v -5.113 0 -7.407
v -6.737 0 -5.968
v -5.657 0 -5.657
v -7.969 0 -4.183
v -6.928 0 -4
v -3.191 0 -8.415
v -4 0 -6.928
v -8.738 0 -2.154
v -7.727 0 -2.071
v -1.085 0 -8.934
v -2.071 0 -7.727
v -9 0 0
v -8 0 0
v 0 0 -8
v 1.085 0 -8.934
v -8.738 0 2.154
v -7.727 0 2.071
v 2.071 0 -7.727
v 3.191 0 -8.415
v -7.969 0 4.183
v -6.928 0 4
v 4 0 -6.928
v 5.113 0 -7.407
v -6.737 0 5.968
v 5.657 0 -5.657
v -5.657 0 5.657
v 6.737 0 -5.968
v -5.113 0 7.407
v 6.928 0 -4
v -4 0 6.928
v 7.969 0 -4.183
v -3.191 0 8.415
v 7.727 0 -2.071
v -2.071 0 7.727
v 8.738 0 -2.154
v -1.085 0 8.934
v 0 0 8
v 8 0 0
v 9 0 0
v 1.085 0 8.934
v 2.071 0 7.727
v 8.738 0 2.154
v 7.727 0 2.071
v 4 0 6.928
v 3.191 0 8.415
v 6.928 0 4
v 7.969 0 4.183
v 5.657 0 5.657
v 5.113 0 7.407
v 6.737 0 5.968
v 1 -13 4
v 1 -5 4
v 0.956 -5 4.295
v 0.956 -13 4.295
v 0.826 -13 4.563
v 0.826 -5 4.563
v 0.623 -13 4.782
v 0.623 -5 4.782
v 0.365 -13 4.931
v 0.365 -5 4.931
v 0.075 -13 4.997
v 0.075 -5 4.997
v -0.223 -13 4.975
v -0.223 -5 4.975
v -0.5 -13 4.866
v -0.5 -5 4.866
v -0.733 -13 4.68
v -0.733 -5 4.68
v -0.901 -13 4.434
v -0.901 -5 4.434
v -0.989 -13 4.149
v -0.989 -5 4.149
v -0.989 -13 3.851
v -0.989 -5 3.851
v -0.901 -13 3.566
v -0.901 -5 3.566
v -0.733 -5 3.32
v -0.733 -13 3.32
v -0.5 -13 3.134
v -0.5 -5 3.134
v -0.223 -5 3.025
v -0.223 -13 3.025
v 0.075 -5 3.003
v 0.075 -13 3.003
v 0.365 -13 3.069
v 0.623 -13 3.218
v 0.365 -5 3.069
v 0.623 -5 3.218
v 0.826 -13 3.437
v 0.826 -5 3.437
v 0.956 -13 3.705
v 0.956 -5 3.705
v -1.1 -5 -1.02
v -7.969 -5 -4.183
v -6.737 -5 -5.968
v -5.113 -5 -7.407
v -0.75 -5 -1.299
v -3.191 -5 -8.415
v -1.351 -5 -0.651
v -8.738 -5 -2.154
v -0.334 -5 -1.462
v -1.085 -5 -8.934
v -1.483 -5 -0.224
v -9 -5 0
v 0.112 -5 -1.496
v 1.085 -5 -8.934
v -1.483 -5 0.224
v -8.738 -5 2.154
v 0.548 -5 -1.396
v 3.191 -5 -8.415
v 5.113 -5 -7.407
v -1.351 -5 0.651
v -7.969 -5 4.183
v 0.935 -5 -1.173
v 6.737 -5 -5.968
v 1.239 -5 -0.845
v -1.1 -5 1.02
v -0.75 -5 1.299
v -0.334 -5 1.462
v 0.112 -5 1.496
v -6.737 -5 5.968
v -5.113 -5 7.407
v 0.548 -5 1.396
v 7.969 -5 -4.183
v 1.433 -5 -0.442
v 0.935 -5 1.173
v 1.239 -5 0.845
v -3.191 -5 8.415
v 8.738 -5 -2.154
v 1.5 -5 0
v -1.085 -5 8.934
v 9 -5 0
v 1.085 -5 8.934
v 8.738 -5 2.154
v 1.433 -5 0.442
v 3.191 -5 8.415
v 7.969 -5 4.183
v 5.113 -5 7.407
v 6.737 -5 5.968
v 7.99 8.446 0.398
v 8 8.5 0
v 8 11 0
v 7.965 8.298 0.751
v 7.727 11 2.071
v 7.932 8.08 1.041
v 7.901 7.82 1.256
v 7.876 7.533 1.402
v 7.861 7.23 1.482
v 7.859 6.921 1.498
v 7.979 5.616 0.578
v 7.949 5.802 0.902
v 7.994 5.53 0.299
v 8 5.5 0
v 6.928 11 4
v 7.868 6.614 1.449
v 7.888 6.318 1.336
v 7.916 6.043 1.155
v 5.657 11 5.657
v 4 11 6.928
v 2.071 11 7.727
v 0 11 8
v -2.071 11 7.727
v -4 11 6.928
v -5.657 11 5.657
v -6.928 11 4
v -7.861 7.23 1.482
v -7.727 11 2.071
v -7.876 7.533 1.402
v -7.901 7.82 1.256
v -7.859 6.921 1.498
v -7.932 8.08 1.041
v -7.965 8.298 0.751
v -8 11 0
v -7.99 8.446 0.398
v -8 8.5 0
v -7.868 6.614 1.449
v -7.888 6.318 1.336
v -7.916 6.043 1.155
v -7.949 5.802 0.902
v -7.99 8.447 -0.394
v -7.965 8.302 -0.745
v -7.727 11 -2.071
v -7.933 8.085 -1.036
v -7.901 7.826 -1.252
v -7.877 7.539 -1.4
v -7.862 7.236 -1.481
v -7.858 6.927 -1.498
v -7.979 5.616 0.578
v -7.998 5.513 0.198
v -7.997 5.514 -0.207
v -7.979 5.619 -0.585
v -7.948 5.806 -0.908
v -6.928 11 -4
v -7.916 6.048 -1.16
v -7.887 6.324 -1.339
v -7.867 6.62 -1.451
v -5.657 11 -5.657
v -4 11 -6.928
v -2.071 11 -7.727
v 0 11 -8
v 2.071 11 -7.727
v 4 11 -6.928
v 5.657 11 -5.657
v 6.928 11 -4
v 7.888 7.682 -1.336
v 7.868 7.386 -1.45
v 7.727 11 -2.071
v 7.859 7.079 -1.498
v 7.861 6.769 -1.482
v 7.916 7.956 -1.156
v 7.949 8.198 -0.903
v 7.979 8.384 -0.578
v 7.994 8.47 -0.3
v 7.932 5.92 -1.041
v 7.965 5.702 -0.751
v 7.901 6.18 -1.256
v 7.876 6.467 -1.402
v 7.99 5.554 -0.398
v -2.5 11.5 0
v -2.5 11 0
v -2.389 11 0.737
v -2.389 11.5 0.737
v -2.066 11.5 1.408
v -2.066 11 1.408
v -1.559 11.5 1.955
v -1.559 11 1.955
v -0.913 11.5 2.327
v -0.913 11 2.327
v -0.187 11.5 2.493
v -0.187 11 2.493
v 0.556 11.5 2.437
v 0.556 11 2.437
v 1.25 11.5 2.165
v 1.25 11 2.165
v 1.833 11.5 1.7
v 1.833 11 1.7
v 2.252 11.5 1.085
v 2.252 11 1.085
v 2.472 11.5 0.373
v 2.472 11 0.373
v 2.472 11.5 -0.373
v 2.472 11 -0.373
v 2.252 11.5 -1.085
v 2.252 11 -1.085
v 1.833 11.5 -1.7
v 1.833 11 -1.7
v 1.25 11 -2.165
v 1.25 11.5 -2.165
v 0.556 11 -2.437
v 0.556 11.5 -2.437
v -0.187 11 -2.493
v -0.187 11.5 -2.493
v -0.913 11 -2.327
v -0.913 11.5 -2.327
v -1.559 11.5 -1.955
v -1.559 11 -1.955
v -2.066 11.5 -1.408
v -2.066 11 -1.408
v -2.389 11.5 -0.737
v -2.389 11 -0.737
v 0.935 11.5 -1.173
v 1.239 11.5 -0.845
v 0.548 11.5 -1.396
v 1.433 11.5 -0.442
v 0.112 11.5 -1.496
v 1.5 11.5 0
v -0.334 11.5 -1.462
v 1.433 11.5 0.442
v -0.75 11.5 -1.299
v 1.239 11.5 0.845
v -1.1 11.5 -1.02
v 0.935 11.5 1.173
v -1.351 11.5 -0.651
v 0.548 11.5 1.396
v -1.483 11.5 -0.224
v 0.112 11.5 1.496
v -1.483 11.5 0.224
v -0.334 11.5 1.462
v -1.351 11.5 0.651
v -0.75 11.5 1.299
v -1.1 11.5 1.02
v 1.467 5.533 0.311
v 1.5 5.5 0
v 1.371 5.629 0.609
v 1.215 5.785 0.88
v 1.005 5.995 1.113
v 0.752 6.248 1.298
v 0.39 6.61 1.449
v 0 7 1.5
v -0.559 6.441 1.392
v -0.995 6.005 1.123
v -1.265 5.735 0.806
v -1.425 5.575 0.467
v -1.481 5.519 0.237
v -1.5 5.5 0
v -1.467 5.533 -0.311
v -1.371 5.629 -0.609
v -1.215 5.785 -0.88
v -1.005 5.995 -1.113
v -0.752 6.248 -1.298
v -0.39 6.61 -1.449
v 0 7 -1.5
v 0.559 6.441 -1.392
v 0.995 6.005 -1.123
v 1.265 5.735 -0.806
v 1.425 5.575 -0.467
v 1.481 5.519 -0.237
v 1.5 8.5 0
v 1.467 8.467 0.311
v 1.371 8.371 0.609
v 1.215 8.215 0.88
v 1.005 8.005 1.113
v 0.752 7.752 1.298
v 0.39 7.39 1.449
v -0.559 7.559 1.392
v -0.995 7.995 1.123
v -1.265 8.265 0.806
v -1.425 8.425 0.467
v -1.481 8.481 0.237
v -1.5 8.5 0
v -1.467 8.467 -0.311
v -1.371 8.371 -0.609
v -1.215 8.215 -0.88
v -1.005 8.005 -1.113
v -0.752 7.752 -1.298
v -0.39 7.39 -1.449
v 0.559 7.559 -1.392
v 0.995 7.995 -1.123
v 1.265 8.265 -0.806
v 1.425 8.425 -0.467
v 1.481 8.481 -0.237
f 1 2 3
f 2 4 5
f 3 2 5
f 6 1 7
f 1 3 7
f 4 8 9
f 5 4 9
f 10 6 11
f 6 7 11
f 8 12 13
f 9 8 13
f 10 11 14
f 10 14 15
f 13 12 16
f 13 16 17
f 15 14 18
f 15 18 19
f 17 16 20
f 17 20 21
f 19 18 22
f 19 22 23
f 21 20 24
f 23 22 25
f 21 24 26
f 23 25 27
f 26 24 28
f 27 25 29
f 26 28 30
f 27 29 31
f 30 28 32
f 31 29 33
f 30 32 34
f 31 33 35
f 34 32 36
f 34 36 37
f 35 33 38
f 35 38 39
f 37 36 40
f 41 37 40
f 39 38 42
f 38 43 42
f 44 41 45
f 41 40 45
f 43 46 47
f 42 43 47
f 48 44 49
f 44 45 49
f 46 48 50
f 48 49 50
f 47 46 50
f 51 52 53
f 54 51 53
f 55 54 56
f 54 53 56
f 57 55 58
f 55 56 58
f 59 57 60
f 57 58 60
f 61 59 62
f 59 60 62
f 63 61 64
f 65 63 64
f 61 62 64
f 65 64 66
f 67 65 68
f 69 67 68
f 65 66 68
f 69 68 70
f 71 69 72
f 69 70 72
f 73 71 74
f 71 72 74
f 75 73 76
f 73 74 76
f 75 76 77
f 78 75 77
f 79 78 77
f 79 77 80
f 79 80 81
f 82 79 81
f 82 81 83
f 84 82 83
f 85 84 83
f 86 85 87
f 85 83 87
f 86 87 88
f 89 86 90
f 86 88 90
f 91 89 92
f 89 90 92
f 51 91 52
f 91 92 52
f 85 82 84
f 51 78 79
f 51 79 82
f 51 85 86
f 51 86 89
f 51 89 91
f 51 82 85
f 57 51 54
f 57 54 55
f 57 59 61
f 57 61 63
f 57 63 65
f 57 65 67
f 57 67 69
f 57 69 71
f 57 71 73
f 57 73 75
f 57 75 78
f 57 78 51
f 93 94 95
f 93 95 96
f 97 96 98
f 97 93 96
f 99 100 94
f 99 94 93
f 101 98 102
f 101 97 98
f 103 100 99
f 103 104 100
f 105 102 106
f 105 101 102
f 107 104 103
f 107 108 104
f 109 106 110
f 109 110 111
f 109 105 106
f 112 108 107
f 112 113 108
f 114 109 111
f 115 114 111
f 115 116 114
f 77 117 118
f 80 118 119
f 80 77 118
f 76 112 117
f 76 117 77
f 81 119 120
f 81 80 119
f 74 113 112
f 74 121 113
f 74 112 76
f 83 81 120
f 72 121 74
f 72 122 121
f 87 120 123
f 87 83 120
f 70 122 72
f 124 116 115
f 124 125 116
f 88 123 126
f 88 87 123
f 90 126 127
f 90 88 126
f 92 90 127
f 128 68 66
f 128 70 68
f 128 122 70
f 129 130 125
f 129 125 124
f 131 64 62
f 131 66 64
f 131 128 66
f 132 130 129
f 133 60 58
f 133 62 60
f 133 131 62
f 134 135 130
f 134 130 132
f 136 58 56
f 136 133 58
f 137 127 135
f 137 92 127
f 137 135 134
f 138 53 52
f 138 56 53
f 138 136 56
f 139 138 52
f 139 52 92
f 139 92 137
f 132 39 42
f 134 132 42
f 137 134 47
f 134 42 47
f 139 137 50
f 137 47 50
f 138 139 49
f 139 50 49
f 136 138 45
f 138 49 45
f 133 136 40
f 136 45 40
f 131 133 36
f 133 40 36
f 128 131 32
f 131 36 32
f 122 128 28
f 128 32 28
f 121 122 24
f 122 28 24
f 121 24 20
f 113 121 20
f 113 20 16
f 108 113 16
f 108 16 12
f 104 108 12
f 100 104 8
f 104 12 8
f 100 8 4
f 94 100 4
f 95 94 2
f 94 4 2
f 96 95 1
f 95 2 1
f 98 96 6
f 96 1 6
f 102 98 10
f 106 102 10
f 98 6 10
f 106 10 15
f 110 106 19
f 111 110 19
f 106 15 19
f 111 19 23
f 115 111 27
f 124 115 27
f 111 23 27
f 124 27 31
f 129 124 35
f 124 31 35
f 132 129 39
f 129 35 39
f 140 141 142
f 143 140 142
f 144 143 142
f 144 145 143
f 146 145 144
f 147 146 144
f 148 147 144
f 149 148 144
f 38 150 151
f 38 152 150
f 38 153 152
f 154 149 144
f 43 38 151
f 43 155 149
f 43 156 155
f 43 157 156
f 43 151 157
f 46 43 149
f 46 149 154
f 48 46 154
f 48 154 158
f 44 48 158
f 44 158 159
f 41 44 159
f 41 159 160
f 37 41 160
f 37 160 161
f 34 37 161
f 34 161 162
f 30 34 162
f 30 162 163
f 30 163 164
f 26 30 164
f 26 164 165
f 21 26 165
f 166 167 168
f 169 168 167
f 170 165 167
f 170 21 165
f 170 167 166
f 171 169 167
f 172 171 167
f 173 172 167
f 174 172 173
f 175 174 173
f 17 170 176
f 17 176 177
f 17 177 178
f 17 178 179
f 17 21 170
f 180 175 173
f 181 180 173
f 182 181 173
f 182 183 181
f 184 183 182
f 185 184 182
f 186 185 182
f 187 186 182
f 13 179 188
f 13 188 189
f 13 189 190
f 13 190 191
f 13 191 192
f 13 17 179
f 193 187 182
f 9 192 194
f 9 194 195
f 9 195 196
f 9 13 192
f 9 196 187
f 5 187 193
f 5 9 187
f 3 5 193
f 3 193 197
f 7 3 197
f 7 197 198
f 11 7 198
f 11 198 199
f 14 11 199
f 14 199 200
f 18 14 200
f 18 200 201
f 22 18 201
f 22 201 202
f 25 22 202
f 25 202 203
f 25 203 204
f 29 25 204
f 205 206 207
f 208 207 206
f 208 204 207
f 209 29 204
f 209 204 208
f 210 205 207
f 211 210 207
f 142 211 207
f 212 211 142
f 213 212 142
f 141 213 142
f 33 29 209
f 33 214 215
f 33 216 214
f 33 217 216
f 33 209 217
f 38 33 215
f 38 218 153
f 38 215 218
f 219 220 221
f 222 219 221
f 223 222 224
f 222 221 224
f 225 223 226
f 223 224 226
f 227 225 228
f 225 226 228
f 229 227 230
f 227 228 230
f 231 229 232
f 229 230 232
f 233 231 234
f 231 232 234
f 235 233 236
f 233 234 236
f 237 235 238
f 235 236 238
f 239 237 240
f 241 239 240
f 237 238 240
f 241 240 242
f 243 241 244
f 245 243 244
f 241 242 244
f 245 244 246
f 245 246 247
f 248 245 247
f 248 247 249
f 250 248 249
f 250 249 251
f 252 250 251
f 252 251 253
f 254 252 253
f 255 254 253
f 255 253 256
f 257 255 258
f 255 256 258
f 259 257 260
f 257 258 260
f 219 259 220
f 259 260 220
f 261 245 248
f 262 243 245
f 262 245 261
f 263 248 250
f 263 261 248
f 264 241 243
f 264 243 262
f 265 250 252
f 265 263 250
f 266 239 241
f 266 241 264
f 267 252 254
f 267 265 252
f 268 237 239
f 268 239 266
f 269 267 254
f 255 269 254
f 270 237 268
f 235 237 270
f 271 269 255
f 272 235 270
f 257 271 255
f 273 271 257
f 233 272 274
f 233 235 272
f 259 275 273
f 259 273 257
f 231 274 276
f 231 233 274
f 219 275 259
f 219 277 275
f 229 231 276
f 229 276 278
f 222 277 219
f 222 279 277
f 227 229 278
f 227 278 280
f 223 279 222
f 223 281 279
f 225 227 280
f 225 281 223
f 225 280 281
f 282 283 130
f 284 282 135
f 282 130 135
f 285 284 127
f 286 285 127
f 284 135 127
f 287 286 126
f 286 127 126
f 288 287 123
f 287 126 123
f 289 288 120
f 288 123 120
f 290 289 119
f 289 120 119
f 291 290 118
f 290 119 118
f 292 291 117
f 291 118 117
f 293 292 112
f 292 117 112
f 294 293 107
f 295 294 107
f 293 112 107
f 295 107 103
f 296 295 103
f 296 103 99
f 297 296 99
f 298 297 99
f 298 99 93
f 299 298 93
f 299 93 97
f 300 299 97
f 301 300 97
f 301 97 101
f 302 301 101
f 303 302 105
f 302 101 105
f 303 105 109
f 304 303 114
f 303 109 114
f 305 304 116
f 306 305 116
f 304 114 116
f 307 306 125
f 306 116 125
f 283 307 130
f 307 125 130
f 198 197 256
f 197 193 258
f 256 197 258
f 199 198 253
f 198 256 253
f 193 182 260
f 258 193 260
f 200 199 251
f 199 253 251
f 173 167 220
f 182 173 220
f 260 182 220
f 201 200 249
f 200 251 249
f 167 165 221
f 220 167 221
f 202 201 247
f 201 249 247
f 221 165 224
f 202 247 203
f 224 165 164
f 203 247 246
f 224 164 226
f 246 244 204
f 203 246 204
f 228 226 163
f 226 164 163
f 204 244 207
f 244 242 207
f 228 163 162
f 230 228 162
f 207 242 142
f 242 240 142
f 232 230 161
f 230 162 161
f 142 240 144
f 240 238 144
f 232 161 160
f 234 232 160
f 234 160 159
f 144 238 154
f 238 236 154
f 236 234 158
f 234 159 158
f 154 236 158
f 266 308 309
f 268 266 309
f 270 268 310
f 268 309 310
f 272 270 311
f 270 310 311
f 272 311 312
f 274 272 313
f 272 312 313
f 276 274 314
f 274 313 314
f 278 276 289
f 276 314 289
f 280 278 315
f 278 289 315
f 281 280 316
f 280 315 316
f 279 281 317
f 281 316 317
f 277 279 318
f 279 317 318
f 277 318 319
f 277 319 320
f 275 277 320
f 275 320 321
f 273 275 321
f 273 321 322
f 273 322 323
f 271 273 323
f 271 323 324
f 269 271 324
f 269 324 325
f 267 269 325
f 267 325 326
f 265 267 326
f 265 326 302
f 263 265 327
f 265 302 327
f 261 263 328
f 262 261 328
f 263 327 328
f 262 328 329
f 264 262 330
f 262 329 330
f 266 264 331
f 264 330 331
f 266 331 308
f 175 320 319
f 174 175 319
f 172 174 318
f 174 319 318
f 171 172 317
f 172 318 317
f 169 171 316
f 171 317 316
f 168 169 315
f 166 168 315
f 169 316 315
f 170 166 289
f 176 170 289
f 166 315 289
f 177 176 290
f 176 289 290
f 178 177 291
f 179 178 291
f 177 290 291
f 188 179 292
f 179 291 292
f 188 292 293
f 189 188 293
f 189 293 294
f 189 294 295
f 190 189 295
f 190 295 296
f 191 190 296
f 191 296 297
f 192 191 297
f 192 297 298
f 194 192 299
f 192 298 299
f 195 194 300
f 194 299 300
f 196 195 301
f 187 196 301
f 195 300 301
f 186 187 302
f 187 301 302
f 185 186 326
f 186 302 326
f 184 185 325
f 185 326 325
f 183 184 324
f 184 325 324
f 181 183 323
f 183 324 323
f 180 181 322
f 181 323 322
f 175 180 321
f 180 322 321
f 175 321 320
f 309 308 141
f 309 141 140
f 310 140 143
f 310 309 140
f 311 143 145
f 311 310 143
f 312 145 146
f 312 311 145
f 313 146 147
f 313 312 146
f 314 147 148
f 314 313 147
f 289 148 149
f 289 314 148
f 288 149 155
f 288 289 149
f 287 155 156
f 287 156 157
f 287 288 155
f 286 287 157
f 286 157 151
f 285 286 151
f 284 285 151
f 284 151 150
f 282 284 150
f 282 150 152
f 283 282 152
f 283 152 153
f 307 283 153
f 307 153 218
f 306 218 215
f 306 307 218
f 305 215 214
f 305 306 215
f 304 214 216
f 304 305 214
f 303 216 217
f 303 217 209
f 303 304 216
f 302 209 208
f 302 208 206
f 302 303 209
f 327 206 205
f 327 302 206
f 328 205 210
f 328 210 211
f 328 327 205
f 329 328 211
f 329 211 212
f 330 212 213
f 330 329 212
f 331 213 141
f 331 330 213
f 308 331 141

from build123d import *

# Parameters (mm, degrees)
F0_R          = 9
F0_R_2        = 8
F1_DEPTH      = 5
F2_DEPTH      = 11
F3_R          = 2.5
F4_DEPTH      = 0.5
F5_R          = 1.5
F6_DEPTH      = 25
F5_R_2        = 1
F7_DEPTH      = 8
F8_R          = 1.5
F9_DEPTH      = 9.001
F9_DEPTH_BACK = 9.001


with BuildPart() as f1:
    # F0 (on Front) → F1 (new body)
    with BuildSketch(Plane.XZ):
        Circle(F0_R)
        Circle(F0_R_2, mode=Mode.SUBTRACT)
        Circle(F0_R_2)
    extrude(amount=F1_DEPTH)

    # F0 (on Front) → F2 (join)
    with BuildSketch(Plane.XZ):
        Circle(F0_R_2)
    extrude(amount=-F2_DEPTH)

    # F3 (on face) → F4 (join)
    with BuildSketch(Plane(origin=(0, 11, 0), x_dir=(-1, 0, 0), z_dir=(0, 1, 0))):
        Circle(F3_R)
    extrude(amount=F4_DEPTH)

    # F5 (on face) → F6 (cut)
    with BuildSketch(Plane.XZ.offset(5)):
        Circle(F5_R)
    extrude(amount=-F6_DEPTH, mode=Mode.SUBTRACT)

    # F5 (on face) → F7 (join)
    with BuildSketch(Plane.XZ.offset(5)):
        with Locations((0, 4)):
            Circle(F5_R_2)
    extrude(amount=F7_DEPTH)

    # F8 (on Right) → F9 (cut, two sides)
    with BuildSketch(Plane.YZ) as f9_sk:
        with Locations((7, 0)):
            Circle(F8_R)
    extrude(amount=-F9_DEPTH, mode=Mode.SUBTRACT)
    extrude(f9_sk.sketch, amount=F9_DEPTH_BACK, mode=Mode.SUBTRACT)


solid = f1.part
